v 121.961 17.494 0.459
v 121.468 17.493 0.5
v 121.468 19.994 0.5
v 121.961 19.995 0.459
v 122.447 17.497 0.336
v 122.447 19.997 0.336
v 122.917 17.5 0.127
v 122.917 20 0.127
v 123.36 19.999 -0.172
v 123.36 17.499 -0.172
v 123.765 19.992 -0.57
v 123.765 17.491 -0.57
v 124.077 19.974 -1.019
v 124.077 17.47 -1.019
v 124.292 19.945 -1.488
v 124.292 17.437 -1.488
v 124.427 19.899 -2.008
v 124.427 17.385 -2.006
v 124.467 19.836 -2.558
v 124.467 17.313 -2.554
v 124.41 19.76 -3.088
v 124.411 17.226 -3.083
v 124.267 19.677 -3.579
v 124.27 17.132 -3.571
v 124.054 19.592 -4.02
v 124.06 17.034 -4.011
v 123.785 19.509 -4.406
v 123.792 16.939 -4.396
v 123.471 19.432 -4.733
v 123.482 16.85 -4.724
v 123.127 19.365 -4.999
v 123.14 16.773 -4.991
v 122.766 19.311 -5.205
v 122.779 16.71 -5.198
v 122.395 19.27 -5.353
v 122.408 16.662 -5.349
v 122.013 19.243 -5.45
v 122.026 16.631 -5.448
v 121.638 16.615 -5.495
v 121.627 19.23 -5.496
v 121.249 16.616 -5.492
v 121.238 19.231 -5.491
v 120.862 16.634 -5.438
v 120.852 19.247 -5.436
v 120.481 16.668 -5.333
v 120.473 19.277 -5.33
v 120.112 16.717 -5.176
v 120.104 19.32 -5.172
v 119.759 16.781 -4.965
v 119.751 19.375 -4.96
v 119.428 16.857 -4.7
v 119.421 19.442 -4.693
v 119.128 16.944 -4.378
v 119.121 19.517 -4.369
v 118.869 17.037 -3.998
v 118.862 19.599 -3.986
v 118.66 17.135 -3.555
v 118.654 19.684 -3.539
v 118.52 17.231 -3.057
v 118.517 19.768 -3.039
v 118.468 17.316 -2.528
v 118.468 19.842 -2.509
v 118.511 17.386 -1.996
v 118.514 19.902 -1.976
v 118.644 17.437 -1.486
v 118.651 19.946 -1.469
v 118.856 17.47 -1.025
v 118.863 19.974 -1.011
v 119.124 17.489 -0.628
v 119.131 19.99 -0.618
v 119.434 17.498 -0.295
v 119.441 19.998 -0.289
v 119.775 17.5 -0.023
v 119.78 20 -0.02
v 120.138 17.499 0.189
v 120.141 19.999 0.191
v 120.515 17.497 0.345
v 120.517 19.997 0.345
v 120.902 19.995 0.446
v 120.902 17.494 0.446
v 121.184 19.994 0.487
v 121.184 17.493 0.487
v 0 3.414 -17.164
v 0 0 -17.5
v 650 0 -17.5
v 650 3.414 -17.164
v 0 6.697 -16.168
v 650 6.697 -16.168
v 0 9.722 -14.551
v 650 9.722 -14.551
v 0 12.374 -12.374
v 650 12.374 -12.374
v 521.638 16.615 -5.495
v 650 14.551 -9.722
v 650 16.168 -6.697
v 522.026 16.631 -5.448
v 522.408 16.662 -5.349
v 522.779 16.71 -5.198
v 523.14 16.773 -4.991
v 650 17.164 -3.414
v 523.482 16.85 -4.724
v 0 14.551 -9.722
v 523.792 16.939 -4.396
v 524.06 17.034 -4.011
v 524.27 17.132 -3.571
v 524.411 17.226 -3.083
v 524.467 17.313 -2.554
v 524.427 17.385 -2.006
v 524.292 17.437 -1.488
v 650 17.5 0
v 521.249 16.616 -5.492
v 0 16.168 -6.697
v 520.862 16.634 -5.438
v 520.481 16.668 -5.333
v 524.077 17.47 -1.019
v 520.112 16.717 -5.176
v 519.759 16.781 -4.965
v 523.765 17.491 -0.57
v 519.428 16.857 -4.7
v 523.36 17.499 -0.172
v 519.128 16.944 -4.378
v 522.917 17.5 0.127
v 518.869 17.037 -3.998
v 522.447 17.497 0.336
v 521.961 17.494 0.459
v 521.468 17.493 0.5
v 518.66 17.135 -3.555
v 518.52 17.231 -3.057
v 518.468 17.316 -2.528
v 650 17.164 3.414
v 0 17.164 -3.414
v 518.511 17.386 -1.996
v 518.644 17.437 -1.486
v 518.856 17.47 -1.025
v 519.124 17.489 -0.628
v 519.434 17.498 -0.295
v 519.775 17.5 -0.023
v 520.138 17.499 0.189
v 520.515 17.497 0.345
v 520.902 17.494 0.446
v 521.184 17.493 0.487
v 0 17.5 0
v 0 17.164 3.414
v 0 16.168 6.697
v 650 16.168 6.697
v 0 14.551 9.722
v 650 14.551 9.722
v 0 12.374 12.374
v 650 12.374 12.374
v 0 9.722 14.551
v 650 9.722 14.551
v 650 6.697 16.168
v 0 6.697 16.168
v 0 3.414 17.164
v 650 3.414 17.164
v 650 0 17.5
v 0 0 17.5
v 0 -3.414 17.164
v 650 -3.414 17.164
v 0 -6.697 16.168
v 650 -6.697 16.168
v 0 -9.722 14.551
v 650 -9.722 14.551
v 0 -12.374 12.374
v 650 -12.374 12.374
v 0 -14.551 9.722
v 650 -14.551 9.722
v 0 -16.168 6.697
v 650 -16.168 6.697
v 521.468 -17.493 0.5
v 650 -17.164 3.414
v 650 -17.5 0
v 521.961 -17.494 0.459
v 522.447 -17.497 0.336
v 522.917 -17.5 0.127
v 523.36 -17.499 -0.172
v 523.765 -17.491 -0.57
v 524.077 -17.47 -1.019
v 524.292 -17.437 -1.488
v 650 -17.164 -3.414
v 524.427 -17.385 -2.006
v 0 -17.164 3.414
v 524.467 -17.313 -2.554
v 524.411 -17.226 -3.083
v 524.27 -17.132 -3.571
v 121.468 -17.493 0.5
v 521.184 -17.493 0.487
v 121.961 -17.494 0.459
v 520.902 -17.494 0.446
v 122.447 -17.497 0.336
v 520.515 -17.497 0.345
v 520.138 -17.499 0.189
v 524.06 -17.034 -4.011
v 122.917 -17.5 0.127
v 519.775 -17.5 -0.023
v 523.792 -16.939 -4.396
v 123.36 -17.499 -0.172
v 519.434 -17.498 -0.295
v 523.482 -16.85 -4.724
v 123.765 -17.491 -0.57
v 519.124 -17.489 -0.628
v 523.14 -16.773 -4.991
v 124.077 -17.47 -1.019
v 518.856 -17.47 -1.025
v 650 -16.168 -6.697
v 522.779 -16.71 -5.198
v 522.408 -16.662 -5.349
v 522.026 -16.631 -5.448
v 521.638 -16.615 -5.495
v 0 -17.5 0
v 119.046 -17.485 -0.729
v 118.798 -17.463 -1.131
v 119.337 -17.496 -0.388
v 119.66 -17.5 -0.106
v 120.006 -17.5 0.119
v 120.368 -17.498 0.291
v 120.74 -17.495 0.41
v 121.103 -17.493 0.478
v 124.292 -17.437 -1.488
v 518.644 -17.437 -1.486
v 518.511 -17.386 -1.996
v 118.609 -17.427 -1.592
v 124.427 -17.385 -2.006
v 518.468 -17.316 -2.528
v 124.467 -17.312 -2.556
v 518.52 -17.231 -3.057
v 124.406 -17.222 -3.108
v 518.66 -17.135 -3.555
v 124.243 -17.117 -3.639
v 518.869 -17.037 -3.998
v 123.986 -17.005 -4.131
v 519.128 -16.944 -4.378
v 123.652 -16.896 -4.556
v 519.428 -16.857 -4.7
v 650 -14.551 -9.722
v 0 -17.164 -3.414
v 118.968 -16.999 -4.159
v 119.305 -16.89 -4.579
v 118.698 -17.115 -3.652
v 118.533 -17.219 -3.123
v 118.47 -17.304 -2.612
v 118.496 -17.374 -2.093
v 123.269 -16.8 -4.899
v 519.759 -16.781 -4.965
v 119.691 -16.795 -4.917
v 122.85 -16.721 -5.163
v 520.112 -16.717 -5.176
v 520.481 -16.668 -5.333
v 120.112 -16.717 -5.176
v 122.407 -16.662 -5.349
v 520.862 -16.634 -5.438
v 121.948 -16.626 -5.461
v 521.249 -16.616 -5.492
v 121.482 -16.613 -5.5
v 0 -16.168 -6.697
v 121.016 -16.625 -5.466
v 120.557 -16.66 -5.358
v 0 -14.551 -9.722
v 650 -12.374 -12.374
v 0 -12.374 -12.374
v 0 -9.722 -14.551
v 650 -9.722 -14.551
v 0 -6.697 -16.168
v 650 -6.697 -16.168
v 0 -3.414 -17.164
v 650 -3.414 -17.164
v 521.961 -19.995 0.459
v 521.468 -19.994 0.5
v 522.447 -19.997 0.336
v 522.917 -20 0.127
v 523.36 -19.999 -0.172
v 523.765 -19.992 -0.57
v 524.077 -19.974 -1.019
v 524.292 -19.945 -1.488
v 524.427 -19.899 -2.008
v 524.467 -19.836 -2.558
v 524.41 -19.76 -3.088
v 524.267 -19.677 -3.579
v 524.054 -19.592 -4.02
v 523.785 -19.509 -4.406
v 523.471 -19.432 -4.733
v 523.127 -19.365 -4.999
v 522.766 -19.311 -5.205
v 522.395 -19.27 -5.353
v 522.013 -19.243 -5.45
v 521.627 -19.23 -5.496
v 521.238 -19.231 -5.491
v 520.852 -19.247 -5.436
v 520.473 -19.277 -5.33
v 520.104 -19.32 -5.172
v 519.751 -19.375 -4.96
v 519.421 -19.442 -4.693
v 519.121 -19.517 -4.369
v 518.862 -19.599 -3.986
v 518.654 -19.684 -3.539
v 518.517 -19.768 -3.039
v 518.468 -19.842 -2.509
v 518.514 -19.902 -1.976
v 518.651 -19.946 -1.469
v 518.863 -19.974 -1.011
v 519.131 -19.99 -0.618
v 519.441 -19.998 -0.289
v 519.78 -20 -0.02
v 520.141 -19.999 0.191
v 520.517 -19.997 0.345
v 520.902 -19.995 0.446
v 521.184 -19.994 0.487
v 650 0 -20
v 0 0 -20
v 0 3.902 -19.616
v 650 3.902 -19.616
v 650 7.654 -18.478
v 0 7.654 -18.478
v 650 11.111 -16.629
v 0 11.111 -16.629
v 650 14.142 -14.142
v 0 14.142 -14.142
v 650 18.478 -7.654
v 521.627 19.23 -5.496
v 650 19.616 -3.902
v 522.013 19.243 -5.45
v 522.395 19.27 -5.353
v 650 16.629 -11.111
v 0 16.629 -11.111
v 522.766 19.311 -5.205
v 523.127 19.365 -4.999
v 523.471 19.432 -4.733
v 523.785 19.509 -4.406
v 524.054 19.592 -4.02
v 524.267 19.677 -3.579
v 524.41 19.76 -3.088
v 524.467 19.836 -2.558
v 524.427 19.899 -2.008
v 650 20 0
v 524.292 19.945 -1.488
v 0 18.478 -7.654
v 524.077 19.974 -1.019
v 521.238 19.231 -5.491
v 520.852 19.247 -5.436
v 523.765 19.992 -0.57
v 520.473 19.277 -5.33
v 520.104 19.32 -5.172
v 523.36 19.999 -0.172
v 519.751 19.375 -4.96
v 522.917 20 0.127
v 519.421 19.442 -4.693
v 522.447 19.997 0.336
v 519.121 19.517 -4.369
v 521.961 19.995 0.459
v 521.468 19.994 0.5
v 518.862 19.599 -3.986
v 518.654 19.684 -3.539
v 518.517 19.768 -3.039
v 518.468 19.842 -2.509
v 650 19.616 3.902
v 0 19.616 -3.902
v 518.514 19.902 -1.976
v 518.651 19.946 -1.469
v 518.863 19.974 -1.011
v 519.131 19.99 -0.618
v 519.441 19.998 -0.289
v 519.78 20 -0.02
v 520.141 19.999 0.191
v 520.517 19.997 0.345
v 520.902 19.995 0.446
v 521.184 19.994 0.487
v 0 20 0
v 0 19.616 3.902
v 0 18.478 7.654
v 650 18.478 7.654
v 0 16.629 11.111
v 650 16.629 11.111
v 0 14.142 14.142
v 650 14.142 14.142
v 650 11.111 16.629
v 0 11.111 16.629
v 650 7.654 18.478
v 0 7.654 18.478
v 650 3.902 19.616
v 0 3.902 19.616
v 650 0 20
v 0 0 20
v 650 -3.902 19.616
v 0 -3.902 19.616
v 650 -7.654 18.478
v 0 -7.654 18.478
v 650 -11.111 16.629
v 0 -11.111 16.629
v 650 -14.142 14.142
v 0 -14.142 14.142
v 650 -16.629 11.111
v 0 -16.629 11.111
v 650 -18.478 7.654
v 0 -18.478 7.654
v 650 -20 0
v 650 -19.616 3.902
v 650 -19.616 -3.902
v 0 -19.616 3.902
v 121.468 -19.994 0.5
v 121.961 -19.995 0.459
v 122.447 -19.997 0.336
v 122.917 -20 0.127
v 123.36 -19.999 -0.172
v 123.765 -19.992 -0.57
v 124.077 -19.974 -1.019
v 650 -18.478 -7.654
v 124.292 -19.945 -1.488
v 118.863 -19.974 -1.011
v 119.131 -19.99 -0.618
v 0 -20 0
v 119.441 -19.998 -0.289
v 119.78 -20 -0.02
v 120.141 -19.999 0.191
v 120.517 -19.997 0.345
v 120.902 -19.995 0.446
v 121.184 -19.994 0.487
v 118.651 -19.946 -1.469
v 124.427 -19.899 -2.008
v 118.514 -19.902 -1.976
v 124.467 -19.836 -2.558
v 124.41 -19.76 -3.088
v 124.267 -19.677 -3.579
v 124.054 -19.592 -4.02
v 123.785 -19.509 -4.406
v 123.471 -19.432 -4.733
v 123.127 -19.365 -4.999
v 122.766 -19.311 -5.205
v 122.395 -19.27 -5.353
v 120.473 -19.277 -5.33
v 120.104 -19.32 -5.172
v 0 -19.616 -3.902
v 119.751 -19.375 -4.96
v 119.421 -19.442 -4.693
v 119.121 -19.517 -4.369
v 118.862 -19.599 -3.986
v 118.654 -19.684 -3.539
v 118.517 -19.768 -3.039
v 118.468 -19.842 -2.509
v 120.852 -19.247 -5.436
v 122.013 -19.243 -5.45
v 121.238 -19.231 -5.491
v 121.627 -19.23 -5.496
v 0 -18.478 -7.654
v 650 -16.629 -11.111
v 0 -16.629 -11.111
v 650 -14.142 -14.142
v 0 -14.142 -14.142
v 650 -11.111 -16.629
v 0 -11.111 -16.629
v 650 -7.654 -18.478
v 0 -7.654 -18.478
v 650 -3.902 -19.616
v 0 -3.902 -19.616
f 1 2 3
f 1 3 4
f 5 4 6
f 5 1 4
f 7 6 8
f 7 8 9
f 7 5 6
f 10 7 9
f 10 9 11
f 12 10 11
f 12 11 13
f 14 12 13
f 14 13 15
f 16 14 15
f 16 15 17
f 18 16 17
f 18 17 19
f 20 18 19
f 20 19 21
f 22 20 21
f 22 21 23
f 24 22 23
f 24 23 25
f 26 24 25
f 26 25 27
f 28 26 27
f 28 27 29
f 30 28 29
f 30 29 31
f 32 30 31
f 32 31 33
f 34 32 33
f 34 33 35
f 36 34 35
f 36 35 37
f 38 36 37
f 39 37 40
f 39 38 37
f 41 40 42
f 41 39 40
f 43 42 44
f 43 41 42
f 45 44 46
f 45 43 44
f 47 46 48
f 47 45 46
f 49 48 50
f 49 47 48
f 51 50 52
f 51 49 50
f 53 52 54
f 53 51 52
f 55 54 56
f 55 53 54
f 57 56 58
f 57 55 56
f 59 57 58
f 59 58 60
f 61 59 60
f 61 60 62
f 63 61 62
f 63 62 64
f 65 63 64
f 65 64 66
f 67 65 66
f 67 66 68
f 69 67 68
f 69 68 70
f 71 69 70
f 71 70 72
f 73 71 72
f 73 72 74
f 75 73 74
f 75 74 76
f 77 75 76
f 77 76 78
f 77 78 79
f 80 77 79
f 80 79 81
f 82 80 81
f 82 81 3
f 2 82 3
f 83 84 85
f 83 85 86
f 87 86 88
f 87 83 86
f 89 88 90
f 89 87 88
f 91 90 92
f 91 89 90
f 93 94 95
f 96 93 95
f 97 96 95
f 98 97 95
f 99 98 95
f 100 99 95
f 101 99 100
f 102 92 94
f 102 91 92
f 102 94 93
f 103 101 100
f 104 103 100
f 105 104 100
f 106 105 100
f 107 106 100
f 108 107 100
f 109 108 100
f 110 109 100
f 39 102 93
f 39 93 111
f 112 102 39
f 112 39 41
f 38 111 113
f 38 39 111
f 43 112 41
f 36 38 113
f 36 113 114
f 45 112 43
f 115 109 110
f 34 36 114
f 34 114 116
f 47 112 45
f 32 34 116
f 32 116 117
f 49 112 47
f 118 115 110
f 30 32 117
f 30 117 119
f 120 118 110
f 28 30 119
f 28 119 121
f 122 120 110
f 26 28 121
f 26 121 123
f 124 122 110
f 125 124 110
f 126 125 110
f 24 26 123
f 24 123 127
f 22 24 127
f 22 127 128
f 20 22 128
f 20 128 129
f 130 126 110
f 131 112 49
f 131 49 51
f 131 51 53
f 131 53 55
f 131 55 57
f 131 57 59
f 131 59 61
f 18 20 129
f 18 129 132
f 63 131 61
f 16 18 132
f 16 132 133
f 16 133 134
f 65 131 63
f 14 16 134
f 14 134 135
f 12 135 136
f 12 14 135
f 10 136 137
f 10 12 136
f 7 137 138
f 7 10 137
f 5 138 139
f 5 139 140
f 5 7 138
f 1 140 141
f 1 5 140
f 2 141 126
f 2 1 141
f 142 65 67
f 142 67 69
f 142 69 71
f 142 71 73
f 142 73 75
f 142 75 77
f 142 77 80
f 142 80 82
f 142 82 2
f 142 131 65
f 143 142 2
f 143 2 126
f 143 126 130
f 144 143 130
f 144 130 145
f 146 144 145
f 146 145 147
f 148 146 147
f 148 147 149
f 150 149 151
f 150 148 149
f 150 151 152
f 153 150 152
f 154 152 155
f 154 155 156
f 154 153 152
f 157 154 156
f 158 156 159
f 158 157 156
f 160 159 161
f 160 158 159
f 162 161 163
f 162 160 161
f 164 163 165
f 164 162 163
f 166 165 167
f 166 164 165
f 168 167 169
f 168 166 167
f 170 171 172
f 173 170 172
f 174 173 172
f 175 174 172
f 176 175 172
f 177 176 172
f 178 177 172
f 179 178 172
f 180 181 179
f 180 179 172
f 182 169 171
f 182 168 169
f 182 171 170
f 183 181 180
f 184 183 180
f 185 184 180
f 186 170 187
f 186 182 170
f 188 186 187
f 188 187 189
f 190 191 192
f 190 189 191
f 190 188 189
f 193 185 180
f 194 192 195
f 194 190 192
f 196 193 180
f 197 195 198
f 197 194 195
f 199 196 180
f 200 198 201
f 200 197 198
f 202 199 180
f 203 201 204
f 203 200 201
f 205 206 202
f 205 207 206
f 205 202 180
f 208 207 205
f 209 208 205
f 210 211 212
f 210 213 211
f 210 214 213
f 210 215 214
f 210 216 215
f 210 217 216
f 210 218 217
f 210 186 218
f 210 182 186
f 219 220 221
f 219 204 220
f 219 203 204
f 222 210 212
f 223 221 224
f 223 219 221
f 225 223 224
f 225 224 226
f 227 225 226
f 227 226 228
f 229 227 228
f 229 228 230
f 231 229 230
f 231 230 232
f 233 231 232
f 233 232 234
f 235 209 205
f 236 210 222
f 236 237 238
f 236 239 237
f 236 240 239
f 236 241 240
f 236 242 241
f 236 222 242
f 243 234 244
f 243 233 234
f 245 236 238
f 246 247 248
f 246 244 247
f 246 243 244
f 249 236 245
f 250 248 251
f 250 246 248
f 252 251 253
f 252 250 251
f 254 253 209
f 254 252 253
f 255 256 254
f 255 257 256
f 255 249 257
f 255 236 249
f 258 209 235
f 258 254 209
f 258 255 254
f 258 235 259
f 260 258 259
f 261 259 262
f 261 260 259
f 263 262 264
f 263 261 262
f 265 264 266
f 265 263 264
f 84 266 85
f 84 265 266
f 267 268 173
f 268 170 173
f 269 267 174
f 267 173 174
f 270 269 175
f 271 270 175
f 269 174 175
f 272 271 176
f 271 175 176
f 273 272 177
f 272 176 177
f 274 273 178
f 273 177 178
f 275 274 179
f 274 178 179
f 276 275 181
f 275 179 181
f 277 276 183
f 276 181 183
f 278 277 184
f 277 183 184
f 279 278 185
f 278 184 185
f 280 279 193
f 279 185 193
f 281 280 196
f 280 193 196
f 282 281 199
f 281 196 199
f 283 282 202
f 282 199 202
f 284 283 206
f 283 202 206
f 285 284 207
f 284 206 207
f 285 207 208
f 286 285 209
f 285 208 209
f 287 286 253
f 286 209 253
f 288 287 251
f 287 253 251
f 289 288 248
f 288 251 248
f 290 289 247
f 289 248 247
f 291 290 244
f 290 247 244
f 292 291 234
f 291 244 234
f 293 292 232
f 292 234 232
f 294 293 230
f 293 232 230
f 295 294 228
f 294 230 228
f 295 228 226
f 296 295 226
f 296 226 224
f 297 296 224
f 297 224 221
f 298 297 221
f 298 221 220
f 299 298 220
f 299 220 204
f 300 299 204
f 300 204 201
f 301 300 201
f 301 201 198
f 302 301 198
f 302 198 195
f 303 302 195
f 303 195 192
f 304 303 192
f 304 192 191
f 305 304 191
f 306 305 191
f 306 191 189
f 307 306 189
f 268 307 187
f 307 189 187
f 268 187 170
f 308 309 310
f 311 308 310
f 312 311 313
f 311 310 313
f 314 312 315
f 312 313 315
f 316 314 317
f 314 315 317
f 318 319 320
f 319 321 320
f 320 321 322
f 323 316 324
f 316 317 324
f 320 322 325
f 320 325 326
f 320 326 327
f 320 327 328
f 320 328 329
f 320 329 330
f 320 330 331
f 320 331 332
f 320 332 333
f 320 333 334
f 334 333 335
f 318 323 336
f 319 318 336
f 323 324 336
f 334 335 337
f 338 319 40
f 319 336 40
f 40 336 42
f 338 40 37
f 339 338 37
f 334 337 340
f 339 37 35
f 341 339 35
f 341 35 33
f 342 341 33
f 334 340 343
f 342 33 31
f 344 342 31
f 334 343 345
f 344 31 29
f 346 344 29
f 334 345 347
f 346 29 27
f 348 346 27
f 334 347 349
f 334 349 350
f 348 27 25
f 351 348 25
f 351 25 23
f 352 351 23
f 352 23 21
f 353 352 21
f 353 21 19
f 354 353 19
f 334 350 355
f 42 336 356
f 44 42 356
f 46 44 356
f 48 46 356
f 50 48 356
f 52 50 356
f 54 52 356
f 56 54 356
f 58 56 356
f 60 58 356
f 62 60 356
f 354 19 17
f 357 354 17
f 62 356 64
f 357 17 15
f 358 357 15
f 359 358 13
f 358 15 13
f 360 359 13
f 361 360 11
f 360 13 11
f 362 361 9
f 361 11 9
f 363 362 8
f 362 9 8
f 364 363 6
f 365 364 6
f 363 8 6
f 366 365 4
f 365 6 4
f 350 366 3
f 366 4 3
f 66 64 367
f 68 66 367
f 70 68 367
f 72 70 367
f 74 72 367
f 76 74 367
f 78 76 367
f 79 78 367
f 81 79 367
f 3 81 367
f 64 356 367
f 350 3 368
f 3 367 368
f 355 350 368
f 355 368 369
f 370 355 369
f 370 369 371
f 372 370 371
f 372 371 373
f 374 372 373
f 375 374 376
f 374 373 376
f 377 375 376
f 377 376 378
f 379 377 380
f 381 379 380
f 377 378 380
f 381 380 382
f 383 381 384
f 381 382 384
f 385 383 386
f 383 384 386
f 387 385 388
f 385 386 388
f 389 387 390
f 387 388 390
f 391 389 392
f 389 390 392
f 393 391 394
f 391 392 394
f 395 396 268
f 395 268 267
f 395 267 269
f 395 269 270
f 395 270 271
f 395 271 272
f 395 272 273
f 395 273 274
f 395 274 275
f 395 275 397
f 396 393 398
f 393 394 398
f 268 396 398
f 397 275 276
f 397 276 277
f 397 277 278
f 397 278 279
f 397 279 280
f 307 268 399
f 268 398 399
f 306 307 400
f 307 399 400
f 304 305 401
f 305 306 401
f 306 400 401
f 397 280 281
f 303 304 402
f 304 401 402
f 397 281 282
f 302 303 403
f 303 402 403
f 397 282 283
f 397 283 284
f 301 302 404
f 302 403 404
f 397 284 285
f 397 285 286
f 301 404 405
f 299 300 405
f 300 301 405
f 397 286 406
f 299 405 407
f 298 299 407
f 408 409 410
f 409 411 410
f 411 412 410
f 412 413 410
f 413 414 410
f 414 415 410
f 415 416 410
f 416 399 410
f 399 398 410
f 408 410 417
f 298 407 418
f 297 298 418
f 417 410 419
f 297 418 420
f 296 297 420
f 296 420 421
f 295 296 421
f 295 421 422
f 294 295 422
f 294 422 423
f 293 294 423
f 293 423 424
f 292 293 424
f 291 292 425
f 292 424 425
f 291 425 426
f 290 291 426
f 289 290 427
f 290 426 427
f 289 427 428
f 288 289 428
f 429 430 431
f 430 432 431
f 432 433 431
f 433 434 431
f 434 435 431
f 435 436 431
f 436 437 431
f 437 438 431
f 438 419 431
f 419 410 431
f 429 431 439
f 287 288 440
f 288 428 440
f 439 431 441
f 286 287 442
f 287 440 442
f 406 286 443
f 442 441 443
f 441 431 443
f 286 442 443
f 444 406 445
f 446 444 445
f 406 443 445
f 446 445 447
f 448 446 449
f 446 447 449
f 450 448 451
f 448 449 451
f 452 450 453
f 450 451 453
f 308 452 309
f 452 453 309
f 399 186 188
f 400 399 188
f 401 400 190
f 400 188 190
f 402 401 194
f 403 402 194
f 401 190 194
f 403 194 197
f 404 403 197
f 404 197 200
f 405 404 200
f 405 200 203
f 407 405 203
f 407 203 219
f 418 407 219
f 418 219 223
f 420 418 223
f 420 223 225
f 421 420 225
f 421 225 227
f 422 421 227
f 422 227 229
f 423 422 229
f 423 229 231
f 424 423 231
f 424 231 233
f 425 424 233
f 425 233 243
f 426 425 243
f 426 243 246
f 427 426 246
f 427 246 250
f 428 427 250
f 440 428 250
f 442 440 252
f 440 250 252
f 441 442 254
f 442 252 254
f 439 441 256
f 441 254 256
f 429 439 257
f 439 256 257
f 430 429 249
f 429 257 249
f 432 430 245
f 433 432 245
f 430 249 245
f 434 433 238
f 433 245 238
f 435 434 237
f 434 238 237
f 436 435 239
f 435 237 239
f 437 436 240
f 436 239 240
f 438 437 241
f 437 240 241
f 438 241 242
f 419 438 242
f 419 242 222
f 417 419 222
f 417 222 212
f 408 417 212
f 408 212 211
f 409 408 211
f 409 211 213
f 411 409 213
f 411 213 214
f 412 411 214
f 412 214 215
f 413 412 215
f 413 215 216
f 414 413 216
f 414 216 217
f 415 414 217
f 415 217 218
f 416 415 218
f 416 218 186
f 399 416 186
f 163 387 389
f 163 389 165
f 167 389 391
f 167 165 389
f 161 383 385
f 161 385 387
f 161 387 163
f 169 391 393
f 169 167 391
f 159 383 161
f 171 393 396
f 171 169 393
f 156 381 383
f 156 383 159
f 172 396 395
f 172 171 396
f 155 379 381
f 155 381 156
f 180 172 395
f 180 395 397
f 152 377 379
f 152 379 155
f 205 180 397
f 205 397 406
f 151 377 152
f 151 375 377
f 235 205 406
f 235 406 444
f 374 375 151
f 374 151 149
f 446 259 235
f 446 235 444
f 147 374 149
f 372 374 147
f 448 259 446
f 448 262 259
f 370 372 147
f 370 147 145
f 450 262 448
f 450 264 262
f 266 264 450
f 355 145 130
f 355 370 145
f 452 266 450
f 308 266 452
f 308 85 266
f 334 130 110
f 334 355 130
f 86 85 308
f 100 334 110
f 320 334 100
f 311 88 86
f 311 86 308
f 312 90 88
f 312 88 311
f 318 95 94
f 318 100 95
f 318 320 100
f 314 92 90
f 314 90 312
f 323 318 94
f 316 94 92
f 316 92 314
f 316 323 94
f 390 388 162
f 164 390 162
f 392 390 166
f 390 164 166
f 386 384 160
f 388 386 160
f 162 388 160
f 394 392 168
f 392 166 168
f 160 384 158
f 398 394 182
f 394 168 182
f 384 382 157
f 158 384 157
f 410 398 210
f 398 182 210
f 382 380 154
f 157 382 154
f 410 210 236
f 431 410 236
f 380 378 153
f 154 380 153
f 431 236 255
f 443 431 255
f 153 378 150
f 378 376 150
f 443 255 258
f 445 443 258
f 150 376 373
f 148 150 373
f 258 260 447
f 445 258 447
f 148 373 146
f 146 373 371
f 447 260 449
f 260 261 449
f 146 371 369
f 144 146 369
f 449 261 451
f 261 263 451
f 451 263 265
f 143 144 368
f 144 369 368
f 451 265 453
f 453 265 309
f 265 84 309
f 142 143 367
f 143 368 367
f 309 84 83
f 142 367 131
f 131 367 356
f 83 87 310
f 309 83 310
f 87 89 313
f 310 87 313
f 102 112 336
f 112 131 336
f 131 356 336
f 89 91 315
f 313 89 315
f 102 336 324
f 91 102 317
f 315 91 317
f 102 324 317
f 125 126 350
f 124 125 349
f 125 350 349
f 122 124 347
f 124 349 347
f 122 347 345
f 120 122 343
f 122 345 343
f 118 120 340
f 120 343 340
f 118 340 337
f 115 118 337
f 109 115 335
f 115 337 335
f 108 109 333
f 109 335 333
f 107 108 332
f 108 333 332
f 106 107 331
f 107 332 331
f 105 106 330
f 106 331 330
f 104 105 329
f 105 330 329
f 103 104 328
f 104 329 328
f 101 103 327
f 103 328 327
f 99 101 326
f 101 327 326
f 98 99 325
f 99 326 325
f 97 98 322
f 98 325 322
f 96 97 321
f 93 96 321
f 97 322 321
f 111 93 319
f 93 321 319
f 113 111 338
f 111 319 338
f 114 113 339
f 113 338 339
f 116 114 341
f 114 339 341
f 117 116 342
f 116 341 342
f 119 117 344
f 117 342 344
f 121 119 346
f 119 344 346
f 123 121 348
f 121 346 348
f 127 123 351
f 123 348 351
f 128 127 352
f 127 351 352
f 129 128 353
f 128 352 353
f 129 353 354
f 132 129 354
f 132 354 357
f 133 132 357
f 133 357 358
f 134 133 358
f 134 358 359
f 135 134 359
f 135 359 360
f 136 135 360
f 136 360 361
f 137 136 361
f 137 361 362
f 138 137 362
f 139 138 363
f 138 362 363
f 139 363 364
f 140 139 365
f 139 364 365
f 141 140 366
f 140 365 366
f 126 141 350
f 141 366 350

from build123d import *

# Parameters (mm, degrees)
SKETCH2_R           = 20
SKETCH2_R_2         = 17.5
BOSS_EXTRUDE1_DEPTH = 650
SKETCH3_R           = 3
CUT_EXTRUDE1_DEPTH  = 30


with BuildPart() as part:
    # Sketch2 → Boss-Extrude1 (new body)
    with BuildSketch(Plane(origin=(0, 0, 0), x_dir=(0, 0, -1), z_dir=(1, 0, 0))):
        Circle(SKETCH2_R)
        Circle(SKETCH2_R_2, mode=Mode.SUBTRACT)
    extrude(amount=BOSS_EXTRUDE1_DEPTH)

    # Sketch3 → Cut-Extrude1 (cut, symmetric)
    with BuildSketch(Plane(origin=(0, 0, 0), x_dir=(1, 0, 0), z_dir=(0, 1, 0))):
        with Locations(Location((121.46797255, 2.5, 0), (0, 0, 270))):
            Circle(SKETCH3_R)
        with Locations(Location((521.46797255, 2.5, 0), (0, 0, 270))):
            Circle(SKETCH3_R)
    extrude(amount=CUT_EXTRUDE1_DEPTH, both=True, mode=Mode.SUBTRACT)


solid = part.part
